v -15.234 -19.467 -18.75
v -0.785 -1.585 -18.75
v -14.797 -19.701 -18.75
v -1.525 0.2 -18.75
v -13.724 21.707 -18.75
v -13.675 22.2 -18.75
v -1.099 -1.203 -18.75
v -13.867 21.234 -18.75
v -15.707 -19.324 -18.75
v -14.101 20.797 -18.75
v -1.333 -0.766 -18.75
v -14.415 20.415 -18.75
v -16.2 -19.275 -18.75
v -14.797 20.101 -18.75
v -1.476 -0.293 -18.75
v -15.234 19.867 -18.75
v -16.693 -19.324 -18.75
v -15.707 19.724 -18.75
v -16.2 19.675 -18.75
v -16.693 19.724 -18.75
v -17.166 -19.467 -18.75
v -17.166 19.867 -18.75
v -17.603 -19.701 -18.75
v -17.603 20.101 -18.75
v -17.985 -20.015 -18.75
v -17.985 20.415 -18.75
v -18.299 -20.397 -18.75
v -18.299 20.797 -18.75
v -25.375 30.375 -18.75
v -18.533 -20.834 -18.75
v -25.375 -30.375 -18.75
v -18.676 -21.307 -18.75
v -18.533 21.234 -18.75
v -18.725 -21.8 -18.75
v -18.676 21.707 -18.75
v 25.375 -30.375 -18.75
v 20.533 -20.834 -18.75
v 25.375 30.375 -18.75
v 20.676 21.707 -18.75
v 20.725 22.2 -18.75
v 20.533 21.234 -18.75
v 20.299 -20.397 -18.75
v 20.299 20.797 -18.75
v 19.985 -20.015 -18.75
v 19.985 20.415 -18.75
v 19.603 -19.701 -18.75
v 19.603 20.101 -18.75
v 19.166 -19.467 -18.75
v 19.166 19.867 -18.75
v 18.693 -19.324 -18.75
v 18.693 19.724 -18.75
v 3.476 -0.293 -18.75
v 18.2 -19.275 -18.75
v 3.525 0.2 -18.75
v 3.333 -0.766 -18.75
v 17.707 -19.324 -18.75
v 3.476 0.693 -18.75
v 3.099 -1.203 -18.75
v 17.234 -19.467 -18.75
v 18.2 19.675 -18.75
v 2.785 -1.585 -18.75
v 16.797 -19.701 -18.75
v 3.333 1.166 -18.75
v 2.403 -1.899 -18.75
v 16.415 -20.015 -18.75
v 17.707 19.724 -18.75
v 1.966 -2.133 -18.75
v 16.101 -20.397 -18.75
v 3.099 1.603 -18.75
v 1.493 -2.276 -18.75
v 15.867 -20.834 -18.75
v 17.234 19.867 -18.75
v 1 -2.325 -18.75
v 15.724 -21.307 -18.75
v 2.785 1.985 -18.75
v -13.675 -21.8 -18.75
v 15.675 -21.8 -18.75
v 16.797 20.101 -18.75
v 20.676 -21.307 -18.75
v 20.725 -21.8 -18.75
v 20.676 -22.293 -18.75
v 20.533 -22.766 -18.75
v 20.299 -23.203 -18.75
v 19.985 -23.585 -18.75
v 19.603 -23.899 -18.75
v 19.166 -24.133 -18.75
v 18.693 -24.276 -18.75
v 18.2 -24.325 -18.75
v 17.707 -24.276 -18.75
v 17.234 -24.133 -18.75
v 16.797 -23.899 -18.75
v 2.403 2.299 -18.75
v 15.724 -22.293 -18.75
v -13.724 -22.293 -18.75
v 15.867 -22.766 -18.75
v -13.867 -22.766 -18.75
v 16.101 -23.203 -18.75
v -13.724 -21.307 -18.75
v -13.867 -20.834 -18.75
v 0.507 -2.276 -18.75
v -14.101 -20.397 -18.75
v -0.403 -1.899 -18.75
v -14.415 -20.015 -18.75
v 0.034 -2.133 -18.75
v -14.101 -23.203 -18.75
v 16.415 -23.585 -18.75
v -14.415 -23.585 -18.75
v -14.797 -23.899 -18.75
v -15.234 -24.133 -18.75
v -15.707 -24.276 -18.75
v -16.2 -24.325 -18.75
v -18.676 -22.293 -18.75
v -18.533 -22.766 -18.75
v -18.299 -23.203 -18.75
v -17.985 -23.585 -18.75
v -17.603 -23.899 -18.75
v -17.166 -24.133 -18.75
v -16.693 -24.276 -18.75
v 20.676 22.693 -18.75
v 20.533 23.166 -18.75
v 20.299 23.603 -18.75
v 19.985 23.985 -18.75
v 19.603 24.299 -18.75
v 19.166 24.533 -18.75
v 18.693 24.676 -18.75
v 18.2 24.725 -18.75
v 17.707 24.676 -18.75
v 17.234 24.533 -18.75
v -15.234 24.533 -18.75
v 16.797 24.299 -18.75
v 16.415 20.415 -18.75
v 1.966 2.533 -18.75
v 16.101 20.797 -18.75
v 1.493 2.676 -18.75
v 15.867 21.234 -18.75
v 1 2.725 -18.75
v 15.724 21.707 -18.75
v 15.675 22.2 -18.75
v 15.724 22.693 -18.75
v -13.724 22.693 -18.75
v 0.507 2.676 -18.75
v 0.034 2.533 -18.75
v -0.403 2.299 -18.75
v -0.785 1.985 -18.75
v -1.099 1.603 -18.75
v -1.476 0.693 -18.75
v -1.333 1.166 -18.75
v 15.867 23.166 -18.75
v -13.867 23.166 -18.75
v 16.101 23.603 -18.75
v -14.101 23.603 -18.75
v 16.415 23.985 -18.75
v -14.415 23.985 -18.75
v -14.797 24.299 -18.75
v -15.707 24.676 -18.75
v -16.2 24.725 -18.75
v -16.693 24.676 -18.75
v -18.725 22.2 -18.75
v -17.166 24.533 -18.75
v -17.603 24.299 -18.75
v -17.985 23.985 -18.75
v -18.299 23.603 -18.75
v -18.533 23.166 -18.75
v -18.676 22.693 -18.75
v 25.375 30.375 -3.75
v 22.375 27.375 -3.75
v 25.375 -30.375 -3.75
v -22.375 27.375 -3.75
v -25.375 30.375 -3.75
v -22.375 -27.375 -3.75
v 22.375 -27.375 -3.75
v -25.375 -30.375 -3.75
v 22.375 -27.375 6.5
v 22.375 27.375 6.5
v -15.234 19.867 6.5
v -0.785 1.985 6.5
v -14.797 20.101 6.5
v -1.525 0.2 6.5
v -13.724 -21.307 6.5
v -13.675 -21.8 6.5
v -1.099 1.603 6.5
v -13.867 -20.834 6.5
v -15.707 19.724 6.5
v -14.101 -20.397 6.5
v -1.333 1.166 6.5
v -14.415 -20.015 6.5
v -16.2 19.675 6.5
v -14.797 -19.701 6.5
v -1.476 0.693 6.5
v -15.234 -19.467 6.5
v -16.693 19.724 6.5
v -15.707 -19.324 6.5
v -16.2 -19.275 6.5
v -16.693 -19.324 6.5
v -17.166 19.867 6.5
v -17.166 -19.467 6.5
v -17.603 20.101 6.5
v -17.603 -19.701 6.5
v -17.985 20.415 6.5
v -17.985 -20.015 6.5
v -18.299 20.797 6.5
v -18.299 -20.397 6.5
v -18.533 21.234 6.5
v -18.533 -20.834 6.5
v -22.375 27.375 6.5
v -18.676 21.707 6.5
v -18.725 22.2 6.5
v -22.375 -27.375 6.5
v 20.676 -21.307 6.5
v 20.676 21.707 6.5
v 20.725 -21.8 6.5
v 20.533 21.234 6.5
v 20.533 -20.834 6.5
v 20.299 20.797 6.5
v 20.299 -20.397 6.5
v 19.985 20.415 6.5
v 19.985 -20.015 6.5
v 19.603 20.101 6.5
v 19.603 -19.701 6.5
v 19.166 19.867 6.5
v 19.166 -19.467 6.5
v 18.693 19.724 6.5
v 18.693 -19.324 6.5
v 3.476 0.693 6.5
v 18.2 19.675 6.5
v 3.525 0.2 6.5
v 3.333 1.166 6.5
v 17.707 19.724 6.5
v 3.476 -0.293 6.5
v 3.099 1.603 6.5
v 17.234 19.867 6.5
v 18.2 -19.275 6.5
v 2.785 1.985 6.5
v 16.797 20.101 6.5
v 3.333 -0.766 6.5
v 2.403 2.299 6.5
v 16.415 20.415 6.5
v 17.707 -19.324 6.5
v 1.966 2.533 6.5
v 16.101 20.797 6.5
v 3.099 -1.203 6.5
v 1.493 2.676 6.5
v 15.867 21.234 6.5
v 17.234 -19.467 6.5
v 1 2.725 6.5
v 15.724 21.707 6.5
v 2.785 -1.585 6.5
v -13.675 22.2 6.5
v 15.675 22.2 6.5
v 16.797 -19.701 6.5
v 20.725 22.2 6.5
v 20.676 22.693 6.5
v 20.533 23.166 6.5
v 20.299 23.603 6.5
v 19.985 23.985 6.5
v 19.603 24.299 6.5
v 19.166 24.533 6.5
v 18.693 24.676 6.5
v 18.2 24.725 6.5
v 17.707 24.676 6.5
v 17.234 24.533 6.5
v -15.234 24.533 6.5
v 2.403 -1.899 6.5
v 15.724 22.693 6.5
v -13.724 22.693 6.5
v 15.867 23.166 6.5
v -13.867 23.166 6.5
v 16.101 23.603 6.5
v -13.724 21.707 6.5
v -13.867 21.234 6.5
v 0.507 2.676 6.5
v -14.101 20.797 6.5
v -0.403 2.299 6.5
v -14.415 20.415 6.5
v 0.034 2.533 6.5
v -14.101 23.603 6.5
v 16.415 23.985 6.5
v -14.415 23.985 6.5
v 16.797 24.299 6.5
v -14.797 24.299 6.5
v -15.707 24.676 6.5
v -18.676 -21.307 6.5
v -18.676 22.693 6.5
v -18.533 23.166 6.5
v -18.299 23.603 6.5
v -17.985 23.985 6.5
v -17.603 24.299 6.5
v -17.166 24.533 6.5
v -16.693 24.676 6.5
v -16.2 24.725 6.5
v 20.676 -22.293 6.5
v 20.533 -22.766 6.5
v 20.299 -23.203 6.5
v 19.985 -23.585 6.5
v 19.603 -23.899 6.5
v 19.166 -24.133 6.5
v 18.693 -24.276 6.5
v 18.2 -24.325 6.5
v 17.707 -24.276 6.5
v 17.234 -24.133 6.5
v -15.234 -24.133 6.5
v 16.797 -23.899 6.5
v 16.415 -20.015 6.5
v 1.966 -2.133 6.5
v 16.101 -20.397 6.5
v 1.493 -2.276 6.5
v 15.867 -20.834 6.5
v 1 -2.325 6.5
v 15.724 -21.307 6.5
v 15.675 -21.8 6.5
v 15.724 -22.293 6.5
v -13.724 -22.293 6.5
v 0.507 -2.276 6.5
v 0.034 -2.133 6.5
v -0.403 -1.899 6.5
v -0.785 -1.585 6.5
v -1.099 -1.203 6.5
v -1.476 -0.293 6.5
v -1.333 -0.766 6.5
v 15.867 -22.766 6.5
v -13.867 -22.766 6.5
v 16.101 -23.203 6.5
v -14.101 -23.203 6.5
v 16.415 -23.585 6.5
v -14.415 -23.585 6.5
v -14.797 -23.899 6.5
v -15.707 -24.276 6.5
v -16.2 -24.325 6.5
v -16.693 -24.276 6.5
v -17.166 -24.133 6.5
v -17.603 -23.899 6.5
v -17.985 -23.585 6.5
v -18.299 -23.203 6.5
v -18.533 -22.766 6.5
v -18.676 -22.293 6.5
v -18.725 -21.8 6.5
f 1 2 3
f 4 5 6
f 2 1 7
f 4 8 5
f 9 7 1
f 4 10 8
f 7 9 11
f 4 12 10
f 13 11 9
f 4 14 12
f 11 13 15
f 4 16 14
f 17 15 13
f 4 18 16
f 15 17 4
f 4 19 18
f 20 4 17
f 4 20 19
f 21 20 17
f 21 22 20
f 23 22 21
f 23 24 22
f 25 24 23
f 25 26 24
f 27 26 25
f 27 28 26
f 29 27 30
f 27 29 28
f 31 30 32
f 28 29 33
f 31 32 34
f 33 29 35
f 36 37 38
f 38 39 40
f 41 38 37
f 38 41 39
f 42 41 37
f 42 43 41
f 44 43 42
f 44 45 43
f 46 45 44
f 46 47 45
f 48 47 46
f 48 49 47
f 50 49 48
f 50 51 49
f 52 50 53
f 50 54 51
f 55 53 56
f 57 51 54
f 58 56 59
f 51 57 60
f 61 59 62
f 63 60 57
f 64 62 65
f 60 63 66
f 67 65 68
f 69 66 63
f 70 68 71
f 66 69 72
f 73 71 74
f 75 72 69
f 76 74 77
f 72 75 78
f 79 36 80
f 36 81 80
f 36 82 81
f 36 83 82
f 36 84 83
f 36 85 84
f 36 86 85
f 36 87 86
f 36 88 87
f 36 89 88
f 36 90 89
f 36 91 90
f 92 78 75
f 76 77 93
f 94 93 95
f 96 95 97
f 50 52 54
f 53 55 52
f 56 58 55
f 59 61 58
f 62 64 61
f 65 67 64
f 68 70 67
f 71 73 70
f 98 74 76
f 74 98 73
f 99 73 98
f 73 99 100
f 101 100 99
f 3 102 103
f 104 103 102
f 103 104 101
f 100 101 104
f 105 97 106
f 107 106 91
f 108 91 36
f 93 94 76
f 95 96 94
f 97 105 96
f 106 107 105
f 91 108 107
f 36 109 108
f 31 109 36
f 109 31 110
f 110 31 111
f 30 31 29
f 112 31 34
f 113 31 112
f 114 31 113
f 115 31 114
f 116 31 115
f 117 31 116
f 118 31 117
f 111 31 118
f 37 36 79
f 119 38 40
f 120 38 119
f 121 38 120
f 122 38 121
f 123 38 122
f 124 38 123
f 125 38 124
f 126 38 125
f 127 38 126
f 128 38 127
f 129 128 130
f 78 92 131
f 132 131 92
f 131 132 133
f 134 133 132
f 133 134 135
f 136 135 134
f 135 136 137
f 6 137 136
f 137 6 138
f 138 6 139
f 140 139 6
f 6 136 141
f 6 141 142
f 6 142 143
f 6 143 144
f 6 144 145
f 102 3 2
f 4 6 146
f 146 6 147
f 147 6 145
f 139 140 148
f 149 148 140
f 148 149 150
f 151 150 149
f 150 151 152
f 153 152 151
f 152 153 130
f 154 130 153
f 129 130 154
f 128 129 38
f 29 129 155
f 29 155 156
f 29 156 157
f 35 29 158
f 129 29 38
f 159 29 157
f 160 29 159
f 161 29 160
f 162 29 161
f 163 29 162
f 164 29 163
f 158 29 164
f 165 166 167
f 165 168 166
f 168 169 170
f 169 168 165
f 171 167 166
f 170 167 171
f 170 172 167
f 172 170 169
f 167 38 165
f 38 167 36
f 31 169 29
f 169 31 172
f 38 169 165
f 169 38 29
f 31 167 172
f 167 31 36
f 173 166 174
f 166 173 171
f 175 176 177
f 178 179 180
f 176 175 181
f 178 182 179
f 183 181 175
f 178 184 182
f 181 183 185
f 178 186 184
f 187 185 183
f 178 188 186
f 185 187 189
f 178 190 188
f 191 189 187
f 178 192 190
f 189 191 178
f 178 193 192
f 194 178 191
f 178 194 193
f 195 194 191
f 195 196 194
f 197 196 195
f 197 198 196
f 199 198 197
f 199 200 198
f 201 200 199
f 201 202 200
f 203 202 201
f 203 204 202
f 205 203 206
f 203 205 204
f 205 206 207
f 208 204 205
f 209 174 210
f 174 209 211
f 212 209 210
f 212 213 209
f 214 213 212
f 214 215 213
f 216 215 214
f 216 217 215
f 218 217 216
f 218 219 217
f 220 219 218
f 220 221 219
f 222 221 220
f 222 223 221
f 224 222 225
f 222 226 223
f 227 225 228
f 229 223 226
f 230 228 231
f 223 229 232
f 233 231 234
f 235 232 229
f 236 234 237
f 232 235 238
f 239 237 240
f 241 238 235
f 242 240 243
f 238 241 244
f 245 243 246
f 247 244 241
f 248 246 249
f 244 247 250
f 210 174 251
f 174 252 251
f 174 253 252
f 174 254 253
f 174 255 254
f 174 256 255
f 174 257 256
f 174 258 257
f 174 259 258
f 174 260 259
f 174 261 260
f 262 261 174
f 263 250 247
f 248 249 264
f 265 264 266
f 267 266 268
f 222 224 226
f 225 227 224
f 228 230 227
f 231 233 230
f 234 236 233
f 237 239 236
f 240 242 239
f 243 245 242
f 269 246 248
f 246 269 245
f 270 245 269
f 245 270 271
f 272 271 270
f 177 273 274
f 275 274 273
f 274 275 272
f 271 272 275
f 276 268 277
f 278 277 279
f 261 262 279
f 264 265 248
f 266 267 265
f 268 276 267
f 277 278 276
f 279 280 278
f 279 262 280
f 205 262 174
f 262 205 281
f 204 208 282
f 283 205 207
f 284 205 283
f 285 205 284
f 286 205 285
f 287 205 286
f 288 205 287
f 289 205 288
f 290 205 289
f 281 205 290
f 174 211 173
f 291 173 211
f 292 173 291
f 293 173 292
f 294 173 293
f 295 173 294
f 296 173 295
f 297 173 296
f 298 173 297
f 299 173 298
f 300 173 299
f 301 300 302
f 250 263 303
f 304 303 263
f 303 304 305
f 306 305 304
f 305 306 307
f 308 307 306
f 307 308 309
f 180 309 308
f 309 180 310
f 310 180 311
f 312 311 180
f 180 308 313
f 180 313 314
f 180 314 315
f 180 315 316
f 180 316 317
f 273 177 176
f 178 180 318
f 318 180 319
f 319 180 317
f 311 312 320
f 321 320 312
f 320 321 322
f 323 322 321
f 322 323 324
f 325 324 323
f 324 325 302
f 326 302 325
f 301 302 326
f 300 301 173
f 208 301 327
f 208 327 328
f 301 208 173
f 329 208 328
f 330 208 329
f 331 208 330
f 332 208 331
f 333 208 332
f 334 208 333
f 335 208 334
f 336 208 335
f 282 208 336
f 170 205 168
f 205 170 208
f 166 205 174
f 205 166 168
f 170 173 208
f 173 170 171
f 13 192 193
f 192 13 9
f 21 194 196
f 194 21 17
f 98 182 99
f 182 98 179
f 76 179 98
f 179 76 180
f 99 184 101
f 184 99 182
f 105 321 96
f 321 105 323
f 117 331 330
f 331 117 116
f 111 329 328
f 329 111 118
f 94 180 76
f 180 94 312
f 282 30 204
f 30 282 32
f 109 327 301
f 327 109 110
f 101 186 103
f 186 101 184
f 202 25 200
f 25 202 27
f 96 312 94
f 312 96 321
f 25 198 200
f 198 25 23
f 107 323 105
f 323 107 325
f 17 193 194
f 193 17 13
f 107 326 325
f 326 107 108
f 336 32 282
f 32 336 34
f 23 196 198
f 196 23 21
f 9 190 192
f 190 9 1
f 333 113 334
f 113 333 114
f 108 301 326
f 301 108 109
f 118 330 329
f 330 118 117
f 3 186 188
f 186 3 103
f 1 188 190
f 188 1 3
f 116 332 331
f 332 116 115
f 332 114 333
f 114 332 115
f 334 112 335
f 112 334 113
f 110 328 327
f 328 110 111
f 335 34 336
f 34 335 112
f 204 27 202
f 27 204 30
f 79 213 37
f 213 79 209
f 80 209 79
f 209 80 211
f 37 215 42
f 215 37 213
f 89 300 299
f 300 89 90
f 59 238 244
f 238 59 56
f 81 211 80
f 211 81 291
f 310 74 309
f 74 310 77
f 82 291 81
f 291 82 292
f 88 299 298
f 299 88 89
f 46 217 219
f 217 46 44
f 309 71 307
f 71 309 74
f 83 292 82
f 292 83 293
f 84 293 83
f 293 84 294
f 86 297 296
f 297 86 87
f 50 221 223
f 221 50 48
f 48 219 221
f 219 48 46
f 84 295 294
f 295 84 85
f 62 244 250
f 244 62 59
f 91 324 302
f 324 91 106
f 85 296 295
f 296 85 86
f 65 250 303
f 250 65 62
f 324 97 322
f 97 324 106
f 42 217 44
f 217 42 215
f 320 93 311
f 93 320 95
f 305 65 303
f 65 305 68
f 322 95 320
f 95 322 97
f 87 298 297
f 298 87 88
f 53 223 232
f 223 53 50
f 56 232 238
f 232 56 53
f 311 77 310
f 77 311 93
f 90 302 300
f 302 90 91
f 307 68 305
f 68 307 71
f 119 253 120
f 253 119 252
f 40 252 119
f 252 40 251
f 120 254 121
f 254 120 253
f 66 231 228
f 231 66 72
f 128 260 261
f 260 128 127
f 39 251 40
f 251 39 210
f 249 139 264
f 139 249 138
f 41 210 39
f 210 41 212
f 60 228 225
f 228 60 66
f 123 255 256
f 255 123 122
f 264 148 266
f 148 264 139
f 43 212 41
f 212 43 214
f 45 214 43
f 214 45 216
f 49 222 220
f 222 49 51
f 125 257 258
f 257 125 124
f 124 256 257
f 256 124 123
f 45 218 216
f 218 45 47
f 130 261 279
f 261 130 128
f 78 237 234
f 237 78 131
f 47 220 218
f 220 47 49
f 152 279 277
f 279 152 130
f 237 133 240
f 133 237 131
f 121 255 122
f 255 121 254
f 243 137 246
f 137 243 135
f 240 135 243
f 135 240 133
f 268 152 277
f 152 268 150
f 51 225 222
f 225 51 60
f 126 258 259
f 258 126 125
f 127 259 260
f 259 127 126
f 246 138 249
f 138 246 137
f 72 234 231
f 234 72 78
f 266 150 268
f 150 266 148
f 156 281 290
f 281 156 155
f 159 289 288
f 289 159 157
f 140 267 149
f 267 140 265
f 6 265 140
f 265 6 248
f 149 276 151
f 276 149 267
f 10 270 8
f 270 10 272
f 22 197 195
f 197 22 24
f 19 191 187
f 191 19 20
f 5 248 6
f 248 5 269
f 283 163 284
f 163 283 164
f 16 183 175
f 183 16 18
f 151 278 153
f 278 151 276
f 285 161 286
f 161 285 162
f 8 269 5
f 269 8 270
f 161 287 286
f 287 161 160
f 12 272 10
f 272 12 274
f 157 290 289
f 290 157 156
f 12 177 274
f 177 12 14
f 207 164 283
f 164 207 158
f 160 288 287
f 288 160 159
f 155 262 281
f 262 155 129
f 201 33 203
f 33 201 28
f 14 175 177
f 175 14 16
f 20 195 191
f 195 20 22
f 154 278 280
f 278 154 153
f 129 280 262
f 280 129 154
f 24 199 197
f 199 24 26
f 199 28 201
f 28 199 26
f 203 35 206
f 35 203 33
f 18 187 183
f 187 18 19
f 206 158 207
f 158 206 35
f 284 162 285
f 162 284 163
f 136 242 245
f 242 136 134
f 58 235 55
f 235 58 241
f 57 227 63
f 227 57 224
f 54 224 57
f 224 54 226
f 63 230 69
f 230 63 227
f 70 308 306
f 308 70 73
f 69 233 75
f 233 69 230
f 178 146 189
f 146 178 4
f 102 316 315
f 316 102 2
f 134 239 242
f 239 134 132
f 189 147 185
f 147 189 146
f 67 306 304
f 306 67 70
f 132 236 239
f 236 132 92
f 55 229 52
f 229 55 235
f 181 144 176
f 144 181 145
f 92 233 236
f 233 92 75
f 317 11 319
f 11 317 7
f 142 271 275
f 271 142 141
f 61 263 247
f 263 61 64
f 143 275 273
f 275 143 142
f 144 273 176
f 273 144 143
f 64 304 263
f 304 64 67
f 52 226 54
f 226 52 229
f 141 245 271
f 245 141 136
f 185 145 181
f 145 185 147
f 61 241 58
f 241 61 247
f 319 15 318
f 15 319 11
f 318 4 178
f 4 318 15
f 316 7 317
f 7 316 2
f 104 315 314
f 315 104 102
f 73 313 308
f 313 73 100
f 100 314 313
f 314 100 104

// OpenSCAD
// file: BOSL2/std.scad
// Minimal BOSL2 compatibility shim for bundled gallery models.
// It implements only the helpers used by the imported OpenSCAD projects.

CENTER = [0, 0, 0];
BOTTOM = [0, 0, -1];
TOP = [0, 0, 1];
LEFT = [-1, 0, 0];
RIGHT = [1, 0, 0];
FRONT = [0, -1, 0];
BACK = [0, 1, 0];

module up(z=0) {
    translate([0, 0, z]) children();
}

module down(z=0) {
    translate([0, 0, -z]) children();
}

module attach(anchor=CENTER) {
    children();
}

module cuboid(size=[1, 1, 1], anchor=CENTER) {
    center = anchor == CENTER;
    translate(center ? [0, 0, 0] : [0, 0, size[2] / 2])
        cube(size, center=true);
    children();
}

module xcyl(h=1, r=1, anchor=CENTER) {
    center = anchor == CENTER;
    translate(center ? [0, 0, 0] : [h / 2, 0, 0])
        rotate([0, 90, 0])
            cylinder(h=h, r=r, center=true);
}
// file: BOSL2/joiners.scad
// Minimal dovetail approximation for bundled gallery models.

module dovetail(type="male", slide=10, width=10, height=4, back_width=12, spin=0) {
    profile = type == "female"
        ? [[-back_width / 2, -height / 2], [back_width / 2, -height / 2], [width / 2, height / 2], [-width / 2, height / 2]]
        : [[-width / 2, -height / 2], [width / 2, -height / 2], [back_width / 2, height / 2], [-back_width / 2, height / 2]];

    rotate([0, 0, spin])
        linear_extrude(height=slide, center=true)
            polygon(profile);
}
// main file
include <BOSL2/joiners.scad>
include <BOSL2/std.scad>
include <Round-Anything/polyround.scad>

module neck_holes(height, tol)
{
    translate([ -16.2, -21.8, 0 ]) cylinder(h = height + 3, d = 5 + tol, center = true, $fn = 32);
    translate([ 18.2, -21.8, 0 ]) cylinder(h = height + 3, d = 5 + tol, center = true, $fn = 32);
    translate([ 18.2, 22.2, 0 ]) cylinder(h = height + 1.5, d = 5 + tol, center = true, $fn = 32);
    translate([ -16.2, 22.2, 0 ]) cylinder(h = height + 1.5, d = 5 + tol, center = true, $fn = 32);
    translate([ 1, 0.2, 0 ]) cylinder(h = height + 1.5, d = 5 + tol, center = true, $fn = 32);
}

module neck_connection(size = [ 51, 61, 45 ], cut, tol)
{
    neck_tol = tol * 5;

    upper_size = [
        cut == true ? size.x - 6 + neck_tol : size.x - 6 - neck_tol,
        cut == true ? size.y - 6 + neck_tol : size.y - 6 - neck_tol, cut == true ? size.z/2.5 : size.z/3 - 2
    ];

    lower_size = [
        cut == true ? size.x + neck_tol : size.x - neck_tol,
        cut == true ? size.y + neck_tol : size.y - neck_tol, cut == true ? size.z/2 : size.z/3
    ];

    difference()
    {
        translate([ 0, 0, cut == true ? 2.5 : 0 ]) union()
        {
            // Thinner Top Section
            cuboid(upper_size, rounding = 2,
                   edges =
                       [
                           TOP + FRONT, TOP + RIGHT, TOP + LEFT, TOP + BACK, FRONT + RIGHT, FRONT + LEFT, BACK + RIGHT,
                           BACK +
                           LEFT
                       ],
                   $fn = 32)
            {
                attach(BOTTOM, BOTTOM, inside = true) translate([ 0, 0, cut == true ? -size.z/4 - 3: -size.z/4 ])
                    // Thicker Lower Section
                    cuboid(lower_size, rounding = 2, edges = [ FRONT + RIGHT, FRONT + LEFT, BACK + RIGHT, BACK + LEFT ],
                           $fn = 32)
                {
                    // position(FRONT)
                    attach(FRONT, overlap = cut == true ? 0 : 0.2) rotate([ cut == true ? 180 : 0, 0, 0 ])
                        dovetail(cut == true ? "female" : "male", angle = 0, w = 30, h = 3,
                                 taper = cut == true ? -1 : 1, slide = lower_size.z,
                                 $slop = cut == true ? tol : tol + 0.02, radius = 0.5, round = true, $fn = 32);
                    attach(BACK, overlap = cut == true ? 0 : 0.2) rotate([ cut == true ? 180 : 0, 0, 0 ])
                        dovetail(cut == true ? "female" : "male", angle = 0, w = 30, h = 3,
                                 taper = cut == true ? -1 : 1, slide = lower_size.z,
                                 $slop = cut == true ? tol : tol + 0.02, radius = 0.5, round = true, $fn = 32);
                }
            }
        }
    if (!cut == true)
    neck_holes(height = size.z + 5, tol = tol);
    }
}

neck_connection(cut = false, tol = 0.05);
